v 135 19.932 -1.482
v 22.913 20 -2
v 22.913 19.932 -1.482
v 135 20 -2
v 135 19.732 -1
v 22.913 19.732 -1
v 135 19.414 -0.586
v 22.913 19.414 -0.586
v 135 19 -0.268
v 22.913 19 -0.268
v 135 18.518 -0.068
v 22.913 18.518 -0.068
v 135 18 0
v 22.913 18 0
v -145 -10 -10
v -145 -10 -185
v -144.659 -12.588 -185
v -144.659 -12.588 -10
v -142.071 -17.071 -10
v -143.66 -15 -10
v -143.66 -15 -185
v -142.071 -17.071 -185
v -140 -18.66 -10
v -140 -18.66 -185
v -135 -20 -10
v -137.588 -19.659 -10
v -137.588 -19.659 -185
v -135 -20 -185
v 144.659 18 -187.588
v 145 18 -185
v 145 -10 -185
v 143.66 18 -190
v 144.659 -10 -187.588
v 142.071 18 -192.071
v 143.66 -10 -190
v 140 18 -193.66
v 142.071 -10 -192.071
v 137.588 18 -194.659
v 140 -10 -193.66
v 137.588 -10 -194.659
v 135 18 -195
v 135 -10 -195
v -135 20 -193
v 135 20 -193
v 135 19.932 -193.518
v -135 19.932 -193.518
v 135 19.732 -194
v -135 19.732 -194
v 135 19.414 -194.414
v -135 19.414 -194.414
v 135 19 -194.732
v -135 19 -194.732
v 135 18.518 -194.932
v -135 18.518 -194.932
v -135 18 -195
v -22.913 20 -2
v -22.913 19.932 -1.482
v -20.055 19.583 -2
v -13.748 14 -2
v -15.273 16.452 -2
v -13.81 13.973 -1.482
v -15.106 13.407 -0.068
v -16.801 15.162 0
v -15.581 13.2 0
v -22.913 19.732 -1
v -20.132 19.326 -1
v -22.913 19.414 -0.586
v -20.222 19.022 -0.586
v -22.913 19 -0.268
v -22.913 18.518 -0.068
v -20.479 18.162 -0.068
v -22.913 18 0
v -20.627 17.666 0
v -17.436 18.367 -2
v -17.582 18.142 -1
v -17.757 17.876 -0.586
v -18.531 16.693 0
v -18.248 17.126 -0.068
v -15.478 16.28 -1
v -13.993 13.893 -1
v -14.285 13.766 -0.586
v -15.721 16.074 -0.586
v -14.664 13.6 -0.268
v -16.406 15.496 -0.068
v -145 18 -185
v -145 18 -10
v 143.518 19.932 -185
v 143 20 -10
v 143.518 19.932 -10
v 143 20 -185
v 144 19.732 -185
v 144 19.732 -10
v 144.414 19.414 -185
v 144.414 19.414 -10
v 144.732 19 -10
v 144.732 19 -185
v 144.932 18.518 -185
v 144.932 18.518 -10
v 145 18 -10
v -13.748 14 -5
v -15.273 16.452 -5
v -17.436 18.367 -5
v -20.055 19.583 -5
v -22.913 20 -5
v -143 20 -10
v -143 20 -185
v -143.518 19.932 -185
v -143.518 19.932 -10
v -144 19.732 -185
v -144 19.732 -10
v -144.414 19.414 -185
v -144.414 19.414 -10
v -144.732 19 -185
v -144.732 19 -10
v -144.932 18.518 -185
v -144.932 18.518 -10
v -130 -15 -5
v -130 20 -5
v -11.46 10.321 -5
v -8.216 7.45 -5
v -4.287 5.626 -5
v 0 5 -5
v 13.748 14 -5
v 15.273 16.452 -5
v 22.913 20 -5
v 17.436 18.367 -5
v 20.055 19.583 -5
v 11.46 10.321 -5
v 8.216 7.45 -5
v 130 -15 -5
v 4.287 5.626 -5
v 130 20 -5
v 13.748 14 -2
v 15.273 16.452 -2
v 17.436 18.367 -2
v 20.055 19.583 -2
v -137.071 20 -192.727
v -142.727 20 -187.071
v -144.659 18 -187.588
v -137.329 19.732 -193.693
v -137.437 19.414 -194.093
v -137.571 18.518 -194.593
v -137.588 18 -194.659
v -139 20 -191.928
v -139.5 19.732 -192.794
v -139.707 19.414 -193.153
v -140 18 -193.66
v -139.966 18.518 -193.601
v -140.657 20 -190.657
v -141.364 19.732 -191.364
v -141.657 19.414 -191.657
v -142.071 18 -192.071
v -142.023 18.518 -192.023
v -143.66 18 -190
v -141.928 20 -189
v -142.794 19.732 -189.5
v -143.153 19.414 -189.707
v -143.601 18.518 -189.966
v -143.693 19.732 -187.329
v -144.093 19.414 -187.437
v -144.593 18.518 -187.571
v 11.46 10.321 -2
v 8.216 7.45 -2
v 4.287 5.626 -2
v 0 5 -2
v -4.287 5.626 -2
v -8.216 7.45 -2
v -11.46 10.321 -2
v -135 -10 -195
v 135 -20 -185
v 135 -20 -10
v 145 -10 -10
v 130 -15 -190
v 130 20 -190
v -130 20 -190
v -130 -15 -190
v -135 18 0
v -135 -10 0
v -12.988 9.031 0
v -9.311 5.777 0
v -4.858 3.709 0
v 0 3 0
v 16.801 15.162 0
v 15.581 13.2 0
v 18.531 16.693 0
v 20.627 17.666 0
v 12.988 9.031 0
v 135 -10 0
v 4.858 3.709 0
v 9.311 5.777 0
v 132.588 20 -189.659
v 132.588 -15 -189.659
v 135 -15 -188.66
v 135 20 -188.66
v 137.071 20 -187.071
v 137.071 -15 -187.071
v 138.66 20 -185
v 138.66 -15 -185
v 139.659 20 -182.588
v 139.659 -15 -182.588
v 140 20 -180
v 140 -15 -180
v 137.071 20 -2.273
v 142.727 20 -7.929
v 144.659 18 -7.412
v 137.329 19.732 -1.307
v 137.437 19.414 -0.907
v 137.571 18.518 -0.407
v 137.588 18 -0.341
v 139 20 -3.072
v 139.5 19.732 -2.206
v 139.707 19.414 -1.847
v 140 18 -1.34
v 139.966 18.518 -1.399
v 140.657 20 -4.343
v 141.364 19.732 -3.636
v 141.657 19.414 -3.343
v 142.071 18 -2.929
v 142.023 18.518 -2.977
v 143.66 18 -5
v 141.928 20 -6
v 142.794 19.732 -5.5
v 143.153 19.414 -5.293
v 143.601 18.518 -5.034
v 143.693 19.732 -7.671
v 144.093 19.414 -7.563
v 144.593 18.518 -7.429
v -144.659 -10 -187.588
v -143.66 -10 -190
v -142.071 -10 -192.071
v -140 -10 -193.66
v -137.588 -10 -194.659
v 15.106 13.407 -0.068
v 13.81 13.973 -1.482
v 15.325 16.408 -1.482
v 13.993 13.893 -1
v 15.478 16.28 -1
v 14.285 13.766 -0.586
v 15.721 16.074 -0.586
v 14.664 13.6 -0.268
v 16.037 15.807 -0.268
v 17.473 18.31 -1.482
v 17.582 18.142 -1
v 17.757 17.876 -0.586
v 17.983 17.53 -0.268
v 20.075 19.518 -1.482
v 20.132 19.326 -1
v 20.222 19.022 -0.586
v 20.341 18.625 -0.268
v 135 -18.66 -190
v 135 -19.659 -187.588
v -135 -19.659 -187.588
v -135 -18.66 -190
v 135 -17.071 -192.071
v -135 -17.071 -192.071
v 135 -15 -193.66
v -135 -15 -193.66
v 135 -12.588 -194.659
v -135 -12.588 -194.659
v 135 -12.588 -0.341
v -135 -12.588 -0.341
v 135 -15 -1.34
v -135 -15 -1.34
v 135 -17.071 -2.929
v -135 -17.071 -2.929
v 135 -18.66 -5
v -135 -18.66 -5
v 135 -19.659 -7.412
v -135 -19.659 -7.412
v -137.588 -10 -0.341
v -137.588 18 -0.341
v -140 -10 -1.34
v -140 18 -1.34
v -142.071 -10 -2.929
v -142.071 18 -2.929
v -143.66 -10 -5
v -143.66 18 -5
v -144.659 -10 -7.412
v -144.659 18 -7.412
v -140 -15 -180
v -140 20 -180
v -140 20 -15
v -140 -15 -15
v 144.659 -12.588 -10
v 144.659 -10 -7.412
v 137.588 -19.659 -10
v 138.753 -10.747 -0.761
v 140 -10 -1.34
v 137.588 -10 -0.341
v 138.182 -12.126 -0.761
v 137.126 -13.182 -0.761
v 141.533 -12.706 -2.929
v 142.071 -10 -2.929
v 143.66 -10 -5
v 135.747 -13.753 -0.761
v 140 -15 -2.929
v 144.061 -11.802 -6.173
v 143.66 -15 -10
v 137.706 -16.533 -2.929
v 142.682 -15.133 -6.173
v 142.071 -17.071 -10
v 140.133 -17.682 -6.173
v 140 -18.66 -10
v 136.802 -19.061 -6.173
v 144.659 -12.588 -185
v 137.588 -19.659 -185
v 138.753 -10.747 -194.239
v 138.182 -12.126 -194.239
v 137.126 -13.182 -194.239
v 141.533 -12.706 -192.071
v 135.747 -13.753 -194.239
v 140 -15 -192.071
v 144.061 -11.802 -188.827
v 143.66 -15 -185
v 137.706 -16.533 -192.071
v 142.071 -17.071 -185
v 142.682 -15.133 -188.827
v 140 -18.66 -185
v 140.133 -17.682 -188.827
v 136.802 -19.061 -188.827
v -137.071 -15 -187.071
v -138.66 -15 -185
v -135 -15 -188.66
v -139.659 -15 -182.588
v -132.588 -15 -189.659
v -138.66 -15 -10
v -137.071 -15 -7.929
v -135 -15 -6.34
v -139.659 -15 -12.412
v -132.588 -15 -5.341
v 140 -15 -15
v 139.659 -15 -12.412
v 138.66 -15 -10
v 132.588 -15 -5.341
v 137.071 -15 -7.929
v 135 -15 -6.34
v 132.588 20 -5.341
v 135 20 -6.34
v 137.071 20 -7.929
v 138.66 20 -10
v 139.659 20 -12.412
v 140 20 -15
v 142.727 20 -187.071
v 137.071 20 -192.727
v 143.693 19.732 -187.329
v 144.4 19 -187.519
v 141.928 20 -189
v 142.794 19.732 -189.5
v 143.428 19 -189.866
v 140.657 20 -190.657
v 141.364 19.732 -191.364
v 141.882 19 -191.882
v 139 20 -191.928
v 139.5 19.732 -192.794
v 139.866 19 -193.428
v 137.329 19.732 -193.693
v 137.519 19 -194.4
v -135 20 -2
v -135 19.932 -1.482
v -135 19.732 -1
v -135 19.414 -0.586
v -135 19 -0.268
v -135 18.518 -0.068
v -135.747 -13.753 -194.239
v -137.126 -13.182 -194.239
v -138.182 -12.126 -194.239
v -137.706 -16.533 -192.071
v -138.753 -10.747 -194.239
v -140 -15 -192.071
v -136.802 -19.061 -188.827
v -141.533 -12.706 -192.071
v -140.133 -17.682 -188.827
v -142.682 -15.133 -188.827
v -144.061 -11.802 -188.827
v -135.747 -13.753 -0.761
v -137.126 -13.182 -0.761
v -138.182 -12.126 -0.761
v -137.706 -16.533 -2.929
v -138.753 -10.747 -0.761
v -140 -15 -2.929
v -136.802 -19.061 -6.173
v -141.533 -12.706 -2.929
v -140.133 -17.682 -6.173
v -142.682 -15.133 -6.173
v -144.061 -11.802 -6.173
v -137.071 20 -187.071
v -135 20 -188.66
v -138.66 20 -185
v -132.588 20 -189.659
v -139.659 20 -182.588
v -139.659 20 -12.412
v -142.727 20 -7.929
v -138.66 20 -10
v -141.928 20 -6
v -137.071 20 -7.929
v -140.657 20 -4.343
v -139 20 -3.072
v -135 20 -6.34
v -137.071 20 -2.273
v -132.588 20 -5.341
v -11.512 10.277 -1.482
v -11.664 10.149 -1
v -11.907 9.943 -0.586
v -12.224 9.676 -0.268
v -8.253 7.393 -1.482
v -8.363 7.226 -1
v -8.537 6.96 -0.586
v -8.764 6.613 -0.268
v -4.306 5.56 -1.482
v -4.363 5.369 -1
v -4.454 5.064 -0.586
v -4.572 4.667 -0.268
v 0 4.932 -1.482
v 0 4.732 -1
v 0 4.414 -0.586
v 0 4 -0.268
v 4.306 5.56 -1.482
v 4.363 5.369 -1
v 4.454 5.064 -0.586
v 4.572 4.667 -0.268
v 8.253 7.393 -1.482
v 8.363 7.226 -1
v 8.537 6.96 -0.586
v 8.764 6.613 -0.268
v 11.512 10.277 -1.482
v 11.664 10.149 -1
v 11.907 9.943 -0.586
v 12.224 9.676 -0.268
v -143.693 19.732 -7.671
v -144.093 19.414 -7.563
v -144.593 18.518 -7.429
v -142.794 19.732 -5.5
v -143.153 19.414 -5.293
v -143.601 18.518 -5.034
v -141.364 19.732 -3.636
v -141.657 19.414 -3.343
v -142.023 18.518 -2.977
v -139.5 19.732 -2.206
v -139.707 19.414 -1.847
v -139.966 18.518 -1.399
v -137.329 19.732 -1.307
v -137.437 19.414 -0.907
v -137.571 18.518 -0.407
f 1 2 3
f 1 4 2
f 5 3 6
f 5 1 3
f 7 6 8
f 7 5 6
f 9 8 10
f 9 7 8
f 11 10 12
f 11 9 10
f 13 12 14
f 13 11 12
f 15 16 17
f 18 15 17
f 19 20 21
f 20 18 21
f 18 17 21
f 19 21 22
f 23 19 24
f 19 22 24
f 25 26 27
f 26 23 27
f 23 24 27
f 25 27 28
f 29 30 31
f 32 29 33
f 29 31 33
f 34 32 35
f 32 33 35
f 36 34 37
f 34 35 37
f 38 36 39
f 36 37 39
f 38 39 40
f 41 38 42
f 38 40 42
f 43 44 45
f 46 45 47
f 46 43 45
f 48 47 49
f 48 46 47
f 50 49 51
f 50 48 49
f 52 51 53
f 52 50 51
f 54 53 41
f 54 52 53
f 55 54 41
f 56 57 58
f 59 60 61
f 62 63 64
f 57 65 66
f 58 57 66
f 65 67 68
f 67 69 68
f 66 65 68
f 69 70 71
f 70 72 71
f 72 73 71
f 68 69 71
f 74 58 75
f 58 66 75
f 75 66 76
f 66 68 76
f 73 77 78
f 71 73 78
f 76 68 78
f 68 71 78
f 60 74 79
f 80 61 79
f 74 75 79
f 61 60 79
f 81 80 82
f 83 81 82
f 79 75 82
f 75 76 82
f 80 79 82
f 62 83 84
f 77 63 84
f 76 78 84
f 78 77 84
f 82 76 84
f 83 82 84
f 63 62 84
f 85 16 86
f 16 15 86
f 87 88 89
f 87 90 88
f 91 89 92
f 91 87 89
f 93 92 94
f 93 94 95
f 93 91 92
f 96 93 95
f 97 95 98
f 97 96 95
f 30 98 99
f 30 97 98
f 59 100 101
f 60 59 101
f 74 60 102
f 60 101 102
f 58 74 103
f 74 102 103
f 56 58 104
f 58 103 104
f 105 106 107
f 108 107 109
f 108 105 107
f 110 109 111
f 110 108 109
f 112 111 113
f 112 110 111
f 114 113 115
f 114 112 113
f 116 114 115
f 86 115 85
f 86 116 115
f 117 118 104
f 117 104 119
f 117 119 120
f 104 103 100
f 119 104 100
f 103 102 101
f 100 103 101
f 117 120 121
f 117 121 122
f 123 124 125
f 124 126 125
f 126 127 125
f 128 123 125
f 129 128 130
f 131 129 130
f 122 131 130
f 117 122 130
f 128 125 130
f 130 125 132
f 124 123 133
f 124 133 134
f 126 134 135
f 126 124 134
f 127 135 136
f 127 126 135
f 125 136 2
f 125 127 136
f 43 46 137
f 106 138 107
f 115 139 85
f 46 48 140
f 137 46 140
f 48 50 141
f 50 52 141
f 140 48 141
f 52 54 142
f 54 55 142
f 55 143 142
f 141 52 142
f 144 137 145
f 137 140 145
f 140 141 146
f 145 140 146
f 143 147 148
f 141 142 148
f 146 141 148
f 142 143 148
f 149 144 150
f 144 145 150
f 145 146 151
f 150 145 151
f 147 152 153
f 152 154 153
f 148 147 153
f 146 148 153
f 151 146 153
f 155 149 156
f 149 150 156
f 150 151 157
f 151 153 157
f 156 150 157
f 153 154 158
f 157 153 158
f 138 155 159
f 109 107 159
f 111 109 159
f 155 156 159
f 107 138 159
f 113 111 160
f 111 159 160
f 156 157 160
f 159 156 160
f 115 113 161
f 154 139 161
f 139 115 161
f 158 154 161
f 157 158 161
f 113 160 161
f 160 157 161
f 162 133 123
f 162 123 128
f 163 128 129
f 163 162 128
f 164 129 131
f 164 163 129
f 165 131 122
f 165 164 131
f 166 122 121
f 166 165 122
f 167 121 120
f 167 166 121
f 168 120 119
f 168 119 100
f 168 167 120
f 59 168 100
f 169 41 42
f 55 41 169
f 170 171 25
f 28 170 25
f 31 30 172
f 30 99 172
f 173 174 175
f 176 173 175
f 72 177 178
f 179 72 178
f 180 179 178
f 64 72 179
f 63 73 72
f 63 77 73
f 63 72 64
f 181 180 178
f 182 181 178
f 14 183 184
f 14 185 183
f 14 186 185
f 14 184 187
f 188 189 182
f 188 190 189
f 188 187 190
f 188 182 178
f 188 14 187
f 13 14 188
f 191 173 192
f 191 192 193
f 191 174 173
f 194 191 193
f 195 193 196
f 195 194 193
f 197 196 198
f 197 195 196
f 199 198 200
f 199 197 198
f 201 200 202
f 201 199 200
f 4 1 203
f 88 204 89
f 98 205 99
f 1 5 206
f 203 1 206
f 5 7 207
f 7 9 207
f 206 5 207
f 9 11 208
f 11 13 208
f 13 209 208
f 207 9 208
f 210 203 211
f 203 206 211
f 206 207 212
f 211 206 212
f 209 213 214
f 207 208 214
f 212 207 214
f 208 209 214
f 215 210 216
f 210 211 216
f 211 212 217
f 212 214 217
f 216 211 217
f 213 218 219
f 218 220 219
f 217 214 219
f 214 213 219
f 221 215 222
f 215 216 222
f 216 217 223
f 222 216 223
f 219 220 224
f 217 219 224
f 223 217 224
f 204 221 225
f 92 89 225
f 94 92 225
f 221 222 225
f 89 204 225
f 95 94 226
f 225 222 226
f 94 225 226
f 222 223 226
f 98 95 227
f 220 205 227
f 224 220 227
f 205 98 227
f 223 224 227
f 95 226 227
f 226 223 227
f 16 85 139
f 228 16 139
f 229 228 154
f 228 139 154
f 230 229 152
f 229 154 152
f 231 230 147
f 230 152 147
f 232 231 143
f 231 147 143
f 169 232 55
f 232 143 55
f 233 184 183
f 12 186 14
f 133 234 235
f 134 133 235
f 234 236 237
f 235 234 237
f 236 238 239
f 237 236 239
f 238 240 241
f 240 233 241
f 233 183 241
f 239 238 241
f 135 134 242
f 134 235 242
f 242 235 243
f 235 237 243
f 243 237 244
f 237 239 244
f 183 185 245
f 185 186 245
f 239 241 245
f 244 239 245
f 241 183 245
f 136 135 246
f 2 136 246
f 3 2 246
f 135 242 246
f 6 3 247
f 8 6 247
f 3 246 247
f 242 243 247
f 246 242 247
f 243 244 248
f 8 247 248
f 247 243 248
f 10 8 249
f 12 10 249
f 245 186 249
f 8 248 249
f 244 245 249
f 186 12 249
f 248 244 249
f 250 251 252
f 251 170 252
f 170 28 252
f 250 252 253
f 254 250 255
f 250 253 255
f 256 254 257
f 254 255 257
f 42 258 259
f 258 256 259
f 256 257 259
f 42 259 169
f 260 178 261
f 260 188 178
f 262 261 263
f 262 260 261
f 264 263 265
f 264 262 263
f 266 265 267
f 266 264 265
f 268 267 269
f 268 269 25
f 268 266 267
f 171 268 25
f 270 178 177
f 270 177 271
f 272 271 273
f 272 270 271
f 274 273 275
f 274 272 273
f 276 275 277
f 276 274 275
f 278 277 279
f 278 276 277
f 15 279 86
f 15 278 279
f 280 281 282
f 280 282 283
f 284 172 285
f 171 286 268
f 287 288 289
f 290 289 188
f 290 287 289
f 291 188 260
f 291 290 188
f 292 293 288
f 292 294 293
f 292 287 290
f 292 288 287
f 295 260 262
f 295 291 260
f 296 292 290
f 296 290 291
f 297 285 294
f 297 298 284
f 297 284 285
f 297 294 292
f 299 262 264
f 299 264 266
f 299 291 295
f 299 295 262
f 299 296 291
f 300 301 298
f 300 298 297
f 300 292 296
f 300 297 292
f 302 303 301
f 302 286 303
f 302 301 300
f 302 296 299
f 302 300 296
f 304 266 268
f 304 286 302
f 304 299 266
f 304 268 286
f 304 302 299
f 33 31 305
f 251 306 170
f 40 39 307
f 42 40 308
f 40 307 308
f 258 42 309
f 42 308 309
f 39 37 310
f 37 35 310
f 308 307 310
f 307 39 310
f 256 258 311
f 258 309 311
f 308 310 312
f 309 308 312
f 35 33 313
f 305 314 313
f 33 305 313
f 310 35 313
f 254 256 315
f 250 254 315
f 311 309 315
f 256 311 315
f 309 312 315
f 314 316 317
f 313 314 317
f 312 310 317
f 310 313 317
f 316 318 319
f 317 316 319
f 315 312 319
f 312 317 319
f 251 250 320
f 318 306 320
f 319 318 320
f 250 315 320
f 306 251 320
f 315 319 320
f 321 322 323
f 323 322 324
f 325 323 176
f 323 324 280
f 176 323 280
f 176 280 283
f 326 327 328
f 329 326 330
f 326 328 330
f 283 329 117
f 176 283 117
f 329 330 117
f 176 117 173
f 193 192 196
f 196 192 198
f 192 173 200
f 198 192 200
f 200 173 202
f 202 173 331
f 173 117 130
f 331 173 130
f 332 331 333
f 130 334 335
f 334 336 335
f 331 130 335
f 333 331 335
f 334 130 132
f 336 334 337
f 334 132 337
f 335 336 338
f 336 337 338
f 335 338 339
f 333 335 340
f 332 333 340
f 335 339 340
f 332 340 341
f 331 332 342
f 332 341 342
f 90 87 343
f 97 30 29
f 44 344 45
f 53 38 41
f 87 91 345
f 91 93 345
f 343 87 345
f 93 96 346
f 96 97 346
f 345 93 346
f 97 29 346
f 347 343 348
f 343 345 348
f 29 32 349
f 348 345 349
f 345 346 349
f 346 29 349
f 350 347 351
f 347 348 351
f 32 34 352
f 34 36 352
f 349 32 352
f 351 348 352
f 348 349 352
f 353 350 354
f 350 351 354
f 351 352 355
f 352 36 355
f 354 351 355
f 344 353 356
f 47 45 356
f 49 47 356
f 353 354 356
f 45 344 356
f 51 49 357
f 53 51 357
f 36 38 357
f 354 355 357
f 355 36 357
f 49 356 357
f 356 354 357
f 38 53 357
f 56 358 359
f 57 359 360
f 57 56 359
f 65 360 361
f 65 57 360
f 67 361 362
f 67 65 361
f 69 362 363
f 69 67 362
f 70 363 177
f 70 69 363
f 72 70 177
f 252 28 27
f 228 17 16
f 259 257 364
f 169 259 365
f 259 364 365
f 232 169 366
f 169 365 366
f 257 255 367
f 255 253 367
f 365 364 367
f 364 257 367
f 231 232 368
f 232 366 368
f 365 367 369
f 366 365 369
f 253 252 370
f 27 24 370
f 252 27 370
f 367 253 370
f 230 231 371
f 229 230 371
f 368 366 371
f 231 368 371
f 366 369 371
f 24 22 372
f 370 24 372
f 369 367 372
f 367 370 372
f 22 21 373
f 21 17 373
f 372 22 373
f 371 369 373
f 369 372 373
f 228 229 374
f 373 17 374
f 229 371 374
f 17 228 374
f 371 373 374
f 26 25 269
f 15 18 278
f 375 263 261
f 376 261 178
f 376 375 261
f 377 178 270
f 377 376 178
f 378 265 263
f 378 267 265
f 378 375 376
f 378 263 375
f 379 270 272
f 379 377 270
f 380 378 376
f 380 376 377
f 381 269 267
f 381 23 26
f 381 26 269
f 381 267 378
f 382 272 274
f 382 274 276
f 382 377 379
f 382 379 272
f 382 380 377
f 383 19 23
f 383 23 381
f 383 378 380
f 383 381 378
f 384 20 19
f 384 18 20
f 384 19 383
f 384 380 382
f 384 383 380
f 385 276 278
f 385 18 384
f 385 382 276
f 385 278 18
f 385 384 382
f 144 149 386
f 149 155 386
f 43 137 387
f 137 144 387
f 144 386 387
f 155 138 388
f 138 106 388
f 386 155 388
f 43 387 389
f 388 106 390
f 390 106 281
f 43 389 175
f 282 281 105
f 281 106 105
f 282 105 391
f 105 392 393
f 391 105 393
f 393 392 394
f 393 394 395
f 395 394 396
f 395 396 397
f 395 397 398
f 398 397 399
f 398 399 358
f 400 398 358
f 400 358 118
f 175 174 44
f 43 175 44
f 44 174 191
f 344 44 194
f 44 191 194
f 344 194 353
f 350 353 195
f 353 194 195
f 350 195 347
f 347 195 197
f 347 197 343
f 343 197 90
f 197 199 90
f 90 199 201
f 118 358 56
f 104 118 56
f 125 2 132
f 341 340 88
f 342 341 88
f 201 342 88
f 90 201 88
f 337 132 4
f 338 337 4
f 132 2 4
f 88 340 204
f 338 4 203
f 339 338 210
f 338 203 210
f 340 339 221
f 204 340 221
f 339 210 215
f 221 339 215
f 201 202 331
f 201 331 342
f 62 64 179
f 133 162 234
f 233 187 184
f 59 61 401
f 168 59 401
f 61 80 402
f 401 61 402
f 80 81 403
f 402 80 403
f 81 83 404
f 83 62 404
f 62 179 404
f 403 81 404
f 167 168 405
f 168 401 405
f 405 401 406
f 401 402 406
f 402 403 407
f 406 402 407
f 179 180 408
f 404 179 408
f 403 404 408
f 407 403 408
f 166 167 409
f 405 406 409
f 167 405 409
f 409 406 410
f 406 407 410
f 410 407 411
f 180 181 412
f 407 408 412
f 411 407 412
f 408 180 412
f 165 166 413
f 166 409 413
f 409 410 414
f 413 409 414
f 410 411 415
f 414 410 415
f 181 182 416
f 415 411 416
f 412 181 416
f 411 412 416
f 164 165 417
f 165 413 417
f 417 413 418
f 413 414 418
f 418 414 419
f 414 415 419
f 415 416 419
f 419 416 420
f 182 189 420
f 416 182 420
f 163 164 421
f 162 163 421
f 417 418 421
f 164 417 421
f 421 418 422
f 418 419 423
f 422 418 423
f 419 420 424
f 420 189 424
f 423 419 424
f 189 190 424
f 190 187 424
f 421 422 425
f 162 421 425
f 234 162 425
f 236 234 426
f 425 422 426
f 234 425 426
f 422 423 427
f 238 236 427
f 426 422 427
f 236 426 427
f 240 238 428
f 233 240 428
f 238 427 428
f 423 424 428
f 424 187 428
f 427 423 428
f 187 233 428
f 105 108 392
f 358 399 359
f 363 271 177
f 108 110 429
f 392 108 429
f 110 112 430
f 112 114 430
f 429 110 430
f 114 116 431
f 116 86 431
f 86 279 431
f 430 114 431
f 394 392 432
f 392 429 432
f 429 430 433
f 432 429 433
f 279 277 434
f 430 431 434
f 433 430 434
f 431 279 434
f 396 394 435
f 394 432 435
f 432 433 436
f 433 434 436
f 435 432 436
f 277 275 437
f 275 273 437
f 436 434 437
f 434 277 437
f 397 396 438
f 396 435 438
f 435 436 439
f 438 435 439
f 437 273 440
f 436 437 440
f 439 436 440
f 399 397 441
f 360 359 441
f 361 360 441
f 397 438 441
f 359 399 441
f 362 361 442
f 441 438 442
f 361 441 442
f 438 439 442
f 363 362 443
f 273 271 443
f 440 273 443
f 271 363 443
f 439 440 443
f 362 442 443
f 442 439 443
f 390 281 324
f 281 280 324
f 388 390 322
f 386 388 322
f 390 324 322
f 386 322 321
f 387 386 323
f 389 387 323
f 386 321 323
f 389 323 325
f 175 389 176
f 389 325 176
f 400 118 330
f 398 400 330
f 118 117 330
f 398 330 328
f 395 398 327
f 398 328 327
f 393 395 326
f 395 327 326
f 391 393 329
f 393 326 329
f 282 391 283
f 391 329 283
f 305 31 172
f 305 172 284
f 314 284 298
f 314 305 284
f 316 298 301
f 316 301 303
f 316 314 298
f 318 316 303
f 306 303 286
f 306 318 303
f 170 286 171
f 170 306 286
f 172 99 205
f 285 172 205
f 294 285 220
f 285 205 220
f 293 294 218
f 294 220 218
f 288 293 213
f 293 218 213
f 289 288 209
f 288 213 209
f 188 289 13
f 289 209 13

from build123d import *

# Parameters (mm, degrees)
BOSS_EXTRUDE1_DEPTH = 5
BOSS_EXTRUDE2_DEPTH = 185
BOSS_EXTRUDE3_DEPTH = 5
FILLET1_R           = 10
FILLET2_R           = 2


with BuildPart() as part:
    # Sketch1 → Boss-Extrude1 (new body)
    with BuildSketch(Plane.XY):
        with BuildLine():
            Line((-145, 20), (-145, -20))
            Line((-145, -20), (145, -20))
            Line((145, -20), (145, 20))
            Line((145, 20), (15, 20))
            ThreePointArc((15, 20), (0, 5), (-15, 20))
            Line((-15, 20), (-145, 20))
        make_face()
    extrude(amount=-BOSS_EXTRUDE1_DEPTH)

    # Sketch2 → Boss-Extrude2 (add)
    with BuildSketch(Plane(origin=(0, 0, -5), x_dir=(-1, 0, 0), z_dir=(0, 0, -1))):
        Polygon((-140, -15), (-140, 15), (-140, 20), (-145, 20), (-145, -20), (145, -20), (145, 20), (140, 20), (140, 15), (140, -15), align=None)
    extrude(amount=BOSS_EXTRUDE2_DEPTH)

    # Sketch3 → Boss-Extrude3 (add)
    with BuildSketch(Plane(origin=(0, 0, -190), x_dir=(-1, 0, 0), z_dir=(0, 0, -1))):
        with BuildLine():
            Line((140, -15), (140, 20))
            Line((140, 20), (15, 20))
            ThreePointArc((15, 20), (0, 5), (-15, 20))
            Line((-15, 20), (-140, 20))
            Line((-140, 20), (-140, -15))
            Line((-140, -15), (140, -15))
        make_face()
        with BuildLine():
            ThreePointArc((-15, 20), (0, 5), (15, 20))
            Line((15, 20), (-15, 20))
        make_face()
        Polygon((145, 20), (140, 20), (140, -15), (-140, -15), (-140, 20), (-145, 20), (-145, -20), (145, -20), align=None)
    extrude(amount=BOSS_EXTRUDE3_DEPTH)

    # Fillet1
    fillet1_edges = [part.edges().sort_by_distance(p)[0] for p in [
        (145, -20, -97.5),
        (-145, -20, -97.5),
        (-15, 20, -2.5),
        (15, 20, -2.5),
        (-140, 2.5, -190),
        (140, 2.5, -190),
        (-140, 2.5, -5),
        (140, 2.5, -5),
        (145, 0, -195),
        (0, -20, -195),
        (-145, 0, -195),
        (145, 0, 0),
        (0, -20, 0),
        (-145, 0, 0),
    ]]
    fillet(fillet1_edges, radius=FILLET1_R)

    # Fillet2
    fillet2_edges = [part.edges().sort_by_distance(p)[0] for p in [
        (142.071067812, 20, -192.071067812),
        (-142.071067812, 20, -192.071067812),
        (142.071067812, 20, -2.928932188),
        (-142.071067812, 20, -2.928932188),
        (0, 20, -195),
        (-145, 20, -97.5),
        (145, 20, -97.5),
        (78.956439237, 20, 0),
        (0, 5, 0),
        (-78.956439237, 20, 0),
        (-17.4356529, 18.366600265, 0),
        (17.4356529, 18.366600265, 0),
    ]]
    fillet(fillet2_edges, radius=FILLET2_R)


solid = part.part
